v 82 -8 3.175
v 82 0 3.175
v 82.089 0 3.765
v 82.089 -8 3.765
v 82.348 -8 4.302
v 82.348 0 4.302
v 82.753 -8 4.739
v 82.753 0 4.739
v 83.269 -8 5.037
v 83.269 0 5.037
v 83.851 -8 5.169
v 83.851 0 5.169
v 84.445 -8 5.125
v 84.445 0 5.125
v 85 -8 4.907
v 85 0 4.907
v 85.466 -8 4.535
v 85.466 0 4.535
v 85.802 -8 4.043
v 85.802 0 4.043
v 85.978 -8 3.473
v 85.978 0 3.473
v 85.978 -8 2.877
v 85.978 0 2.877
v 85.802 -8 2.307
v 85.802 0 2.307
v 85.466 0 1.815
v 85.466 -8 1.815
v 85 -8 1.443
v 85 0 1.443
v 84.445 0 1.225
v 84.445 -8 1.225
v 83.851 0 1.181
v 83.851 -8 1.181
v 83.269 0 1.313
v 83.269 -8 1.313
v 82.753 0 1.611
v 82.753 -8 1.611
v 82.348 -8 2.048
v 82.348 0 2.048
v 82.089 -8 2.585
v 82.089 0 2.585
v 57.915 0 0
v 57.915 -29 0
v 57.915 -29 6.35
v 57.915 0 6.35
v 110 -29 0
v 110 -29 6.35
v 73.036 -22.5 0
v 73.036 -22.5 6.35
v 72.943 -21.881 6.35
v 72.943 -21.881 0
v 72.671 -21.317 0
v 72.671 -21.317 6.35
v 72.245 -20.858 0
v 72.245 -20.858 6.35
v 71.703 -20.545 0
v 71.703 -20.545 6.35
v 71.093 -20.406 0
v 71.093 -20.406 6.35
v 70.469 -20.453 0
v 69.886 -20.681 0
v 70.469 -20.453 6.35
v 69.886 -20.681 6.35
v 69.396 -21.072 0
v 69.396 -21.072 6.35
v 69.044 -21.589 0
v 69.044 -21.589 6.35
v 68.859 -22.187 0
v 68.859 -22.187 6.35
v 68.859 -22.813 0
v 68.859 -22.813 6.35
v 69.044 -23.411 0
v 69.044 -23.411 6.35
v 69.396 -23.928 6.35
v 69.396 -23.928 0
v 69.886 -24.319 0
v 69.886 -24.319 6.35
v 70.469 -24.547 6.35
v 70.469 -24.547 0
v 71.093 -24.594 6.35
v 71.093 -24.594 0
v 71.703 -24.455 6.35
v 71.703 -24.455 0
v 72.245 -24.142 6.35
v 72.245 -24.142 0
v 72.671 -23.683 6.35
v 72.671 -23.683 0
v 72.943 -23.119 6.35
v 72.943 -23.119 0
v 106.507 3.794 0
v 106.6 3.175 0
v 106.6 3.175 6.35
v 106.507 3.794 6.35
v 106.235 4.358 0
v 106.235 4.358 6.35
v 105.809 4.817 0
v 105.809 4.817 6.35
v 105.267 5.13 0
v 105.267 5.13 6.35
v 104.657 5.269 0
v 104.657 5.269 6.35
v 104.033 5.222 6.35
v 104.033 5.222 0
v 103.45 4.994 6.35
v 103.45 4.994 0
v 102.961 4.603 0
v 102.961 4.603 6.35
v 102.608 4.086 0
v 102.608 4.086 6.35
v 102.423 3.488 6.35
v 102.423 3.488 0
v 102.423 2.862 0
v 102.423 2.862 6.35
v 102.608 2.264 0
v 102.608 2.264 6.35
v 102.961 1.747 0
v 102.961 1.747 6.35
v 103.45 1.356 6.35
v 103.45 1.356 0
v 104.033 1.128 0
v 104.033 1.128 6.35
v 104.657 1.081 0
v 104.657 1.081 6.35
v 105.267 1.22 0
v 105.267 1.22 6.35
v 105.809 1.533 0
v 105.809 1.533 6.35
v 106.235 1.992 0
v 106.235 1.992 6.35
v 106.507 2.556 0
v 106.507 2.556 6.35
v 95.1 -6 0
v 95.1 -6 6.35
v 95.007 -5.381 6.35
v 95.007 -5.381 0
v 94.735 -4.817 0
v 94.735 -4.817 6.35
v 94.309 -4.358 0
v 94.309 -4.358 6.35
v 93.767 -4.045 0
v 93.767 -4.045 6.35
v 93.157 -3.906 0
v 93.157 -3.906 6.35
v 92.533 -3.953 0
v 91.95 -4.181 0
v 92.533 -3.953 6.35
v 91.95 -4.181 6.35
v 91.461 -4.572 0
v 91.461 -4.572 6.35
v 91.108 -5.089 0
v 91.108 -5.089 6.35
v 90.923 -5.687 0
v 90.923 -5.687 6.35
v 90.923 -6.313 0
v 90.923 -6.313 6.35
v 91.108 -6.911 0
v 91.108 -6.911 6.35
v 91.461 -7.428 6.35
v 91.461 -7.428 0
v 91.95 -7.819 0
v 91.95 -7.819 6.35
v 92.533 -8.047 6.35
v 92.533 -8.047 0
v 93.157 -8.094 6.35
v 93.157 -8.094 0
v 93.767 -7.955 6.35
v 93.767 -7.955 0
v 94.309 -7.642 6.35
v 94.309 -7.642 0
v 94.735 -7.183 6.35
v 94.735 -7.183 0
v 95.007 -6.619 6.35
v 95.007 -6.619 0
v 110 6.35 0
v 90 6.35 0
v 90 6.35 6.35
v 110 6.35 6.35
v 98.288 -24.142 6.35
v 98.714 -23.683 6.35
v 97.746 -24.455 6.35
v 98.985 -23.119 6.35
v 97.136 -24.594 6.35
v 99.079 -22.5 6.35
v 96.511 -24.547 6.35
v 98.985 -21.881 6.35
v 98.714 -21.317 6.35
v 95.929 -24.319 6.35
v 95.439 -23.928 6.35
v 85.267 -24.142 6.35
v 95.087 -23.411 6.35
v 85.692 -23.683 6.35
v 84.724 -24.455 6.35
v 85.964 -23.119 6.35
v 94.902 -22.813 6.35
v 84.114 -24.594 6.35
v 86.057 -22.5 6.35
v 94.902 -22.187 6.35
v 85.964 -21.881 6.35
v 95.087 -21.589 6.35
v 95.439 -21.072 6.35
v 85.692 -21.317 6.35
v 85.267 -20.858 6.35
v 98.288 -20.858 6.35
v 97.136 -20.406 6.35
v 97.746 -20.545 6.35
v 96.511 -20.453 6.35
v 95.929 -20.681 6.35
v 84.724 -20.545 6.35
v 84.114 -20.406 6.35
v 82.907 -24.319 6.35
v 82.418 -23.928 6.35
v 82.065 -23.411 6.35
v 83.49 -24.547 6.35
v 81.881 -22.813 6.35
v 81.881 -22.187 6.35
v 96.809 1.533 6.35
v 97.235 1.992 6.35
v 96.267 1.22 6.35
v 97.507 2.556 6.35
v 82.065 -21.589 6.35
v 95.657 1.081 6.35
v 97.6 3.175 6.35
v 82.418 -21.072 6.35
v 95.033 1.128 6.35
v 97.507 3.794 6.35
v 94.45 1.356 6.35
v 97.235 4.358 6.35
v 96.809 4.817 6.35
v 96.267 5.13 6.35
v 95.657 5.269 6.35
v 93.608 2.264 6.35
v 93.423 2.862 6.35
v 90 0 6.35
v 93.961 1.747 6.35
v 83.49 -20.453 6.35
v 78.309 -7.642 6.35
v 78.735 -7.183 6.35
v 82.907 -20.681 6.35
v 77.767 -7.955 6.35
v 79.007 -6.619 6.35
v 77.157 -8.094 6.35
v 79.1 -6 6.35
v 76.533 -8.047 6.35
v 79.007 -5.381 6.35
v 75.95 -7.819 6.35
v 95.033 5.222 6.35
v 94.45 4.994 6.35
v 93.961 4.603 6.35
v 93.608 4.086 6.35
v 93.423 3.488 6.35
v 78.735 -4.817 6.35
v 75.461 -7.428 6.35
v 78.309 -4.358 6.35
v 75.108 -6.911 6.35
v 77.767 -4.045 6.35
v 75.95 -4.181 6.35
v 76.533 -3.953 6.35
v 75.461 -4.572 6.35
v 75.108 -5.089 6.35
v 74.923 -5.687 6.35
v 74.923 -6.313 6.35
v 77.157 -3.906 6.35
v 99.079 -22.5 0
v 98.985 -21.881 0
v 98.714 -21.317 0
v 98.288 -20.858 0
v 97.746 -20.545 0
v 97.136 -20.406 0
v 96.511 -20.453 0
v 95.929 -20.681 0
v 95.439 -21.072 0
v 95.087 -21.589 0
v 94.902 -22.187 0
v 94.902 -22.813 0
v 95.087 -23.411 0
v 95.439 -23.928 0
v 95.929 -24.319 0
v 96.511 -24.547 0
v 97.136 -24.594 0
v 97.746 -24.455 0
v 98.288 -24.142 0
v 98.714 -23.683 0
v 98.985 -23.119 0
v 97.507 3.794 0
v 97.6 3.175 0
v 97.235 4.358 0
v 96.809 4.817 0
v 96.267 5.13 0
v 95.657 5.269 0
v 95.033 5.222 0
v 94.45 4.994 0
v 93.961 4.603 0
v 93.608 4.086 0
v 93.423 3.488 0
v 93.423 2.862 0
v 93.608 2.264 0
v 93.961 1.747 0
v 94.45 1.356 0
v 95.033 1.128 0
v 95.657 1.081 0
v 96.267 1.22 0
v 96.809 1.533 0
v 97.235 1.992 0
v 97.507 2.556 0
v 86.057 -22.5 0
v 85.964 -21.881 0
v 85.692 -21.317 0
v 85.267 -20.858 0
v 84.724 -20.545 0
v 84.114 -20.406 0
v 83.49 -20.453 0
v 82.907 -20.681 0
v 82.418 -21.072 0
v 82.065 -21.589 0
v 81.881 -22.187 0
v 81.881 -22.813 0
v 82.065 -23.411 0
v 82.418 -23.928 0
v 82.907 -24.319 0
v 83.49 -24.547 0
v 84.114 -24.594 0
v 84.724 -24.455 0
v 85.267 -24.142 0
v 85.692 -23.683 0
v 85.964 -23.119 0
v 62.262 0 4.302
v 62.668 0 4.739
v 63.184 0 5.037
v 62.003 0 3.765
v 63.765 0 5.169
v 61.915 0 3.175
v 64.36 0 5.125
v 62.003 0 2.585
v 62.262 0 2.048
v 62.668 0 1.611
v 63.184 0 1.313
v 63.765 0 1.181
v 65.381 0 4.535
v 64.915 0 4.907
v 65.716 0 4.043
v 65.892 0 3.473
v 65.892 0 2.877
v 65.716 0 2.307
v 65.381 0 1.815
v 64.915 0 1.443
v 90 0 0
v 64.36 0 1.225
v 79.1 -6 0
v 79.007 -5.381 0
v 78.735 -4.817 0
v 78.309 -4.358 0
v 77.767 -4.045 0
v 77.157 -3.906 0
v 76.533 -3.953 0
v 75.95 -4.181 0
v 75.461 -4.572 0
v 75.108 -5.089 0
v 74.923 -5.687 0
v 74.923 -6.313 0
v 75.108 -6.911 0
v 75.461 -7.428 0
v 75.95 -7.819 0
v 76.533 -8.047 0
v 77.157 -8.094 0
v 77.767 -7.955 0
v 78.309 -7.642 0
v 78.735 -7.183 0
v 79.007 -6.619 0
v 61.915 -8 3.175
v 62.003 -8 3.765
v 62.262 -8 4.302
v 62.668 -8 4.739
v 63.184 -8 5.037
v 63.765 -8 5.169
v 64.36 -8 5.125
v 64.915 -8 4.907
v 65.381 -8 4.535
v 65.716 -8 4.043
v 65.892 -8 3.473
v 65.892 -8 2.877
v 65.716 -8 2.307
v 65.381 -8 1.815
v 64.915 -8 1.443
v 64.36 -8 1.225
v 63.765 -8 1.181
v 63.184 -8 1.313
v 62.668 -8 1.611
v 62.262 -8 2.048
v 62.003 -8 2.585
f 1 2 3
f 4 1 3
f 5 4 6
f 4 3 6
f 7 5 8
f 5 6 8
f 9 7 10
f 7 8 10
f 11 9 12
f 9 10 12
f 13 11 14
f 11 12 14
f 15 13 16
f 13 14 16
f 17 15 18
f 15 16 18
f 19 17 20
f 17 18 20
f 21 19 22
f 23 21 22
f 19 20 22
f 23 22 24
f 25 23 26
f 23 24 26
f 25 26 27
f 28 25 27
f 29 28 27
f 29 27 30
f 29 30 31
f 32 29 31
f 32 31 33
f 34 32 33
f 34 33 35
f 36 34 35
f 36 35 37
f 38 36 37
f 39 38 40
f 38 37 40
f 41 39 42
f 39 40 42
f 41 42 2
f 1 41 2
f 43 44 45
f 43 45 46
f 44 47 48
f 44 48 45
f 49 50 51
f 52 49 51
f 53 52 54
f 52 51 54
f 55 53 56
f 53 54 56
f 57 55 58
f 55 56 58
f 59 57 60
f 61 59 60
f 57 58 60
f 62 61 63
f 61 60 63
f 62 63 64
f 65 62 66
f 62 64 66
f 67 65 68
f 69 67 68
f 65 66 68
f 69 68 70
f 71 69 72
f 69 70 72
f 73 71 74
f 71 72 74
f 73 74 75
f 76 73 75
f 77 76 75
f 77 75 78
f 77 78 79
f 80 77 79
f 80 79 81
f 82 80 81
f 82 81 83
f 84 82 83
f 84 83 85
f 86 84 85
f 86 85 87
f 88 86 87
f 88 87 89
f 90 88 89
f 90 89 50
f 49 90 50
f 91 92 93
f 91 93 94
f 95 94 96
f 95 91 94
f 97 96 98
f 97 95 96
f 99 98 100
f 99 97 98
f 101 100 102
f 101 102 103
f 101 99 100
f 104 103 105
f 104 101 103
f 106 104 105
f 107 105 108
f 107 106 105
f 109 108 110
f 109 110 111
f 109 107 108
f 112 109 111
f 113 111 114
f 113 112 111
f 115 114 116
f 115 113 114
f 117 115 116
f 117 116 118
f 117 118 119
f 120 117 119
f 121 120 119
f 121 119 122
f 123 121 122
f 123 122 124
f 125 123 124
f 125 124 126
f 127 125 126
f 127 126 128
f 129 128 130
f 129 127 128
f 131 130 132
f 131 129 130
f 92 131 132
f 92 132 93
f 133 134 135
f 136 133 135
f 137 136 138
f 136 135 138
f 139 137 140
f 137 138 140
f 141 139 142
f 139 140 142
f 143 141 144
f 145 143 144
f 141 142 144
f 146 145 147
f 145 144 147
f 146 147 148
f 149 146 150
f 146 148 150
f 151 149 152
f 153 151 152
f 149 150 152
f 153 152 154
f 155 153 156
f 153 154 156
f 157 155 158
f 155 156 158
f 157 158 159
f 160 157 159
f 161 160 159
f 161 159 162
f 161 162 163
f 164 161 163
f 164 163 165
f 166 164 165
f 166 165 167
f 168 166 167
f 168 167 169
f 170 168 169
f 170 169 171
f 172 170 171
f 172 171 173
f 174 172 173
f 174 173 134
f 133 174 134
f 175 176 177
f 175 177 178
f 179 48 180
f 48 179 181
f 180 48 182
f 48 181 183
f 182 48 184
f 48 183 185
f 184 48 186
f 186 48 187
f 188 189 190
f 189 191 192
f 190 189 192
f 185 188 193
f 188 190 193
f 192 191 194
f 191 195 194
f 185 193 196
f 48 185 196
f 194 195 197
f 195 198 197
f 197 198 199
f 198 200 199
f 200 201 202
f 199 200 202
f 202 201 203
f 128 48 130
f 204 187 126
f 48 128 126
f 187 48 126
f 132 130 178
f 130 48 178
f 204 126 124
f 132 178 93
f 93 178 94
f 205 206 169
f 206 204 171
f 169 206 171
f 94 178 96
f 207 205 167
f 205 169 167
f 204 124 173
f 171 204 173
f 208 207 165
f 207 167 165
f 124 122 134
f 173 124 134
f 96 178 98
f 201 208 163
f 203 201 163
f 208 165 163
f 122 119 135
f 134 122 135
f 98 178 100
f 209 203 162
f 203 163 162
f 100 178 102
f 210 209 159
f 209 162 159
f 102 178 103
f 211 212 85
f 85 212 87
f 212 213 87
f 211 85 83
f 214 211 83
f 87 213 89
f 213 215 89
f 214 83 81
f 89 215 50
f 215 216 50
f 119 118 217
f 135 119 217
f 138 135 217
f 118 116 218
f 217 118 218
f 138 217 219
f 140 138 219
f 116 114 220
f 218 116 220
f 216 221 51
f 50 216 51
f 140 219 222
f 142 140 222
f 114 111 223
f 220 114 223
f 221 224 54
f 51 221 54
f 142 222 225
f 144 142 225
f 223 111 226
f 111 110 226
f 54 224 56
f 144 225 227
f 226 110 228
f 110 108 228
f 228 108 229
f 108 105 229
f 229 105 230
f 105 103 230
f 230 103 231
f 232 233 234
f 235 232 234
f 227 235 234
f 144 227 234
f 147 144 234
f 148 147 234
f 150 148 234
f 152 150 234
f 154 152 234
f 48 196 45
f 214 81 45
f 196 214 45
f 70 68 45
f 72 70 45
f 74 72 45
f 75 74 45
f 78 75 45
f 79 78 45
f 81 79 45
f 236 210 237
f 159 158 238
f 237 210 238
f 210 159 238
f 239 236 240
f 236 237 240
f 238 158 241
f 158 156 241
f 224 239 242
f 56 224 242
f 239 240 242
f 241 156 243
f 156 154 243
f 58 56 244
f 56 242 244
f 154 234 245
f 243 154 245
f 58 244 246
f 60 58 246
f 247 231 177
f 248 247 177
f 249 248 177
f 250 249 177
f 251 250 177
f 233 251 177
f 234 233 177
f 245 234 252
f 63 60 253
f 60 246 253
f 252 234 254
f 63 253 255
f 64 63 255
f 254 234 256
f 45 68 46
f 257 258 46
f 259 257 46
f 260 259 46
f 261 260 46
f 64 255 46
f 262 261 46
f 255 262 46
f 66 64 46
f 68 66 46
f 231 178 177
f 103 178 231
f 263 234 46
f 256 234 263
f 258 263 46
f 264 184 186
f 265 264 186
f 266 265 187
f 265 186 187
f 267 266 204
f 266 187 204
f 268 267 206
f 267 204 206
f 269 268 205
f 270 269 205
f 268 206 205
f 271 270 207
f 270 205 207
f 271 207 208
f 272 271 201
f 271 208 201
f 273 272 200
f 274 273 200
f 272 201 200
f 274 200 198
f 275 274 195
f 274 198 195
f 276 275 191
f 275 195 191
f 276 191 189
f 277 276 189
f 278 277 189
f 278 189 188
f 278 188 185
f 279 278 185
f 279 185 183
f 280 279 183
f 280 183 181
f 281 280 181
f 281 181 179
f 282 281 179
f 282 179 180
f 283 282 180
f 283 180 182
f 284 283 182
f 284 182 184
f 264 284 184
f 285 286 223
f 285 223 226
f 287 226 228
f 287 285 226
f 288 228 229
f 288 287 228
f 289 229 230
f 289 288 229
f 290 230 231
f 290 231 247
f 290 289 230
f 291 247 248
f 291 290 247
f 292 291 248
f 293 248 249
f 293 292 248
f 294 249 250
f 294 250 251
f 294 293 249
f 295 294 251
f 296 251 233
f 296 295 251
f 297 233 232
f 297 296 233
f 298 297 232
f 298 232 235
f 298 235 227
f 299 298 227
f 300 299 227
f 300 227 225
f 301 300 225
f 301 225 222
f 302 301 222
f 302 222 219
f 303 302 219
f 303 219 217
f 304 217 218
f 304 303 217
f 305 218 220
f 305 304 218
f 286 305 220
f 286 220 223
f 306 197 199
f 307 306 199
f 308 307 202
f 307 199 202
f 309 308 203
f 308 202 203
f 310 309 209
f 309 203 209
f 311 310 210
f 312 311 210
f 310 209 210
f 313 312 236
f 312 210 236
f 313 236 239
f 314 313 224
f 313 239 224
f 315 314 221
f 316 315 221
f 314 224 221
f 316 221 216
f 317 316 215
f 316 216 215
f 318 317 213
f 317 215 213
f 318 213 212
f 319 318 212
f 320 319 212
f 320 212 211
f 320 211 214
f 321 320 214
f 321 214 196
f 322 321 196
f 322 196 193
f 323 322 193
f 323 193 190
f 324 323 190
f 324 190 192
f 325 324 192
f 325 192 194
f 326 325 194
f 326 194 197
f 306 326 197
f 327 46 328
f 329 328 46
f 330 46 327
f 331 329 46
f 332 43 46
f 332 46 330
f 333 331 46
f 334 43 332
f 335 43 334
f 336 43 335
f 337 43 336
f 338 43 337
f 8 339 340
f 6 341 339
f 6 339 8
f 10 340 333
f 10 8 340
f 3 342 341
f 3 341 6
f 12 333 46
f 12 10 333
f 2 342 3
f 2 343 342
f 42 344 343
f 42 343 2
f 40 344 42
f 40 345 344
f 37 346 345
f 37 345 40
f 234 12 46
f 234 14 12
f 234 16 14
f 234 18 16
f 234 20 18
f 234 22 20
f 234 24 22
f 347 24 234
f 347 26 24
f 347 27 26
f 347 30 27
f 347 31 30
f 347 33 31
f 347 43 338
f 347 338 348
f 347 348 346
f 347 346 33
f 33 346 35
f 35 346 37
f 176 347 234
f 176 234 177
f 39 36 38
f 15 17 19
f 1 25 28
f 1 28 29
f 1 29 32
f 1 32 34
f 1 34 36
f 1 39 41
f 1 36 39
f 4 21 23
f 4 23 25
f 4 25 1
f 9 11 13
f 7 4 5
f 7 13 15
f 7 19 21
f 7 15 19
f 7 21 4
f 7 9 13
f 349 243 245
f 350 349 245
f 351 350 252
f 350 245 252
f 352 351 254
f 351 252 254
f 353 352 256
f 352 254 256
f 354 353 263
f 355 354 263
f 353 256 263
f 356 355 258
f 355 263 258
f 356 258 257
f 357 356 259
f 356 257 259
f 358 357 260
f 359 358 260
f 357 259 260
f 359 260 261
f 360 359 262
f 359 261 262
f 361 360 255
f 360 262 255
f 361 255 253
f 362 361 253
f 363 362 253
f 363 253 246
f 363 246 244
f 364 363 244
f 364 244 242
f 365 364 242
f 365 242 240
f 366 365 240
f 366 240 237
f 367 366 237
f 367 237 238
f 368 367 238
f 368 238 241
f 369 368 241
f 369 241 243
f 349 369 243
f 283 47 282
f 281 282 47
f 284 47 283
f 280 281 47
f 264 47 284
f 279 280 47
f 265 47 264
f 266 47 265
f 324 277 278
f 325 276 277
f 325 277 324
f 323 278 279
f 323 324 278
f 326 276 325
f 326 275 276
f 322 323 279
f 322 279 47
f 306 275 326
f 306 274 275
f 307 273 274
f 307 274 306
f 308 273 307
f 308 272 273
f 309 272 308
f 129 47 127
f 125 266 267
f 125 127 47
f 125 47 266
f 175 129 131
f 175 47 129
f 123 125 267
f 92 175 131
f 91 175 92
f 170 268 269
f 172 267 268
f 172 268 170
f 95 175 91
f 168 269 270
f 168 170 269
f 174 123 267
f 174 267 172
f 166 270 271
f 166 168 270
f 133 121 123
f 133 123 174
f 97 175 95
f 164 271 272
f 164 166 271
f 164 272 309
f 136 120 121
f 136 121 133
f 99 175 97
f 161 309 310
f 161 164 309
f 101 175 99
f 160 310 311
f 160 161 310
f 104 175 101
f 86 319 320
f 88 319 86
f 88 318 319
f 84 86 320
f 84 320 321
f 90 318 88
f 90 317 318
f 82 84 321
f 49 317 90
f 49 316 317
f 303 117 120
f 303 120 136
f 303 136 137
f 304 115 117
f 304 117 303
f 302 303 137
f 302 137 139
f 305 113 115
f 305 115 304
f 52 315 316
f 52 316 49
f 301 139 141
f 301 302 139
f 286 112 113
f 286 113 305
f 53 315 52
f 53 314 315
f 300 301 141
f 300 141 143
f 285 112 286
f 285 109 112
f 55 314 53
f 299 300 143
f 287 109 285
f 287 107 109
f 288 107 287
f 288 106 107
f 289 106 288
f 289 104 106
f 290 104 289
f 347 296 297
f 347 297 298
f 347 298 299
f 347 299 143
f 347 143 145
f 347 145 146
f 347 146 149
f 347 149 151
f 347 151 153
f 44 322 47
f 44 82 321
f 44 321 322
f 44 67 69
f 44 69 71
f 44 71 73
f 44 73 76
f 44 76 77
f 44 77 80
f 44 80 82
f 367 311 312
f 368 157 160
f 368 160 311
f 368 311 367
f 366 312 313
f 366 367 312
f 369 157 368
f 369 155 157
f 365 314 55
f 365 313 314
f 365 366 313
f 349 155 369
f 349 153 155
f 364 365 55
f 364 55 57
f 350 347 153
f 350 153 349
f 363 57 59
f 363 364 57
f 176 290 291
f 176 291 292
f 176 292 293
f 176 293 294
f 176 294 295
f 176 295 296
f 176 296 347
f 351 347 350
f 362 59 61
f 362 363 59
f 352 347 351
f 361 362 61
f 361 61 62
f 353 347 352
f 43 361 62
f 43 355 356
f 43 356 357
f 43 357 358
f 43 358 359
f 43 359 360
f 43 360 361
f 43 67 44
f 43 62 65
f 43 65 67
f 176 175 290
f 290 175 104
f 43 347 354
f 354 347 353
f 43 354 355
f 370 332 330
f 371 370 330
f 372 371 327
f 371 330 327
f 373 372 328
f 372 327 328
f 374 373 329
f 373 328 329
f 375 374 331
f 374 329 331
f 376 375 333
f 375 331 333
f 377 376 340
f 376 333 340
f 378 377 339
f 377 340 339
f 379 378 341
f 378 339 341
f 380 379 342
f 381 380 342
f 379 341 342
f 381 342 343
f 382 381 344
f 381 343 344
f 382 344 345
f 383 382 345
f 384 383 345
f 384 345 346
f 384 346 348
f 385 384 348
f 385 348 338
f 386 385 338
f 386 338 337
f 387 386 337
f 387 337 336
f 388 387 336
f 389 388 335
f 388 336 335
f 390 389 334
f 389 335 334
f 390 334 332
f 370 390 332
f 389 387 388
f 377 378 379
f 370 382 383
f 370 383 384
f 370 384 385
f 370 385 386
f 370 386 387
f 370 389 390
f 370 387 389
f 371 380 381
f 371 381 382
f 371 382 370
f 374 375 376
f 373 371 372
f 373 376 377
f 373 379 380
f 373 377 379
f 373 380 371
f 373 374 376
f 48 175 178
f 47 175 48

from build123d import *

# Parameters (mm, degrees)
SKETCH1_R           = 2.1
BOSS_EXTRUDE1_DEPTH = 6.35
SKETCH2_R           = 2.1
CUT_EXTRUDE1_DEPTH  = 7.35
SKETCH3_R           = 2
CUT_EXTRUDE2_DEPTH  = 8


with BuildPart() as part:
    # Sketch1 → Boss-Extrude1 (new body)
    with BuildSketch(Plane.XY):
        Polygon((90, 6.35), (110, 6.35), (110, -29), (57.914505889, -29), (57.914505889, 0), (90, 0), align=None)
        with Locations((95.5, 3.175)):
            Circle(SKETCH1_R, mode=Mode.SUBTRACT)
        with Locations((104.5, 3.175)):
            Circle(SKETCH1_R, mode=Mode.SUBTRACT)
    extrude(amount=BOSS_EXTRUDE1_DEPTH)

    # Sketch2 → Cut-Extrude1 (cut, through all)
    with BuildSketch(Plane.XY.offset(6.35)):
        with Locations((70.935879417, -22.5)):
            Circle(SKETCH2_R)
        with Locations((83.957252945, -22.5)):
            Circle(SKETCH2_R)
        with Locations((96.978626472, -22.5)):
            Circle(SKETCH2_R)
        with Locations((93, -6)):
            Circle(SKETCH2_R)
        with Locations((77, -6)):
            Circle(SKETCH2_R)
    extrude(amount=-CUT_EXTRUDE1_DEPTH, mode=Mode.SUBTRACT)

    # Sketch3 → Cut-Extrude2 (cut)
    with BuildSketch(Plane(origin=(0, 0, 0), x_dir=(-1, 0, 0), z_dir=(0, 1, 0))):
        with Locations((-84, 3.175)):
            Circle(SKETCH3_R)
        with Locations((-63.914505889, 3.175)):
            Circle(SKETCH3_R)
    extrude(amount=-CUT_EXTRUDE2_DEPTH, mode=Mode.SUBTRACT)


solid = part.part
